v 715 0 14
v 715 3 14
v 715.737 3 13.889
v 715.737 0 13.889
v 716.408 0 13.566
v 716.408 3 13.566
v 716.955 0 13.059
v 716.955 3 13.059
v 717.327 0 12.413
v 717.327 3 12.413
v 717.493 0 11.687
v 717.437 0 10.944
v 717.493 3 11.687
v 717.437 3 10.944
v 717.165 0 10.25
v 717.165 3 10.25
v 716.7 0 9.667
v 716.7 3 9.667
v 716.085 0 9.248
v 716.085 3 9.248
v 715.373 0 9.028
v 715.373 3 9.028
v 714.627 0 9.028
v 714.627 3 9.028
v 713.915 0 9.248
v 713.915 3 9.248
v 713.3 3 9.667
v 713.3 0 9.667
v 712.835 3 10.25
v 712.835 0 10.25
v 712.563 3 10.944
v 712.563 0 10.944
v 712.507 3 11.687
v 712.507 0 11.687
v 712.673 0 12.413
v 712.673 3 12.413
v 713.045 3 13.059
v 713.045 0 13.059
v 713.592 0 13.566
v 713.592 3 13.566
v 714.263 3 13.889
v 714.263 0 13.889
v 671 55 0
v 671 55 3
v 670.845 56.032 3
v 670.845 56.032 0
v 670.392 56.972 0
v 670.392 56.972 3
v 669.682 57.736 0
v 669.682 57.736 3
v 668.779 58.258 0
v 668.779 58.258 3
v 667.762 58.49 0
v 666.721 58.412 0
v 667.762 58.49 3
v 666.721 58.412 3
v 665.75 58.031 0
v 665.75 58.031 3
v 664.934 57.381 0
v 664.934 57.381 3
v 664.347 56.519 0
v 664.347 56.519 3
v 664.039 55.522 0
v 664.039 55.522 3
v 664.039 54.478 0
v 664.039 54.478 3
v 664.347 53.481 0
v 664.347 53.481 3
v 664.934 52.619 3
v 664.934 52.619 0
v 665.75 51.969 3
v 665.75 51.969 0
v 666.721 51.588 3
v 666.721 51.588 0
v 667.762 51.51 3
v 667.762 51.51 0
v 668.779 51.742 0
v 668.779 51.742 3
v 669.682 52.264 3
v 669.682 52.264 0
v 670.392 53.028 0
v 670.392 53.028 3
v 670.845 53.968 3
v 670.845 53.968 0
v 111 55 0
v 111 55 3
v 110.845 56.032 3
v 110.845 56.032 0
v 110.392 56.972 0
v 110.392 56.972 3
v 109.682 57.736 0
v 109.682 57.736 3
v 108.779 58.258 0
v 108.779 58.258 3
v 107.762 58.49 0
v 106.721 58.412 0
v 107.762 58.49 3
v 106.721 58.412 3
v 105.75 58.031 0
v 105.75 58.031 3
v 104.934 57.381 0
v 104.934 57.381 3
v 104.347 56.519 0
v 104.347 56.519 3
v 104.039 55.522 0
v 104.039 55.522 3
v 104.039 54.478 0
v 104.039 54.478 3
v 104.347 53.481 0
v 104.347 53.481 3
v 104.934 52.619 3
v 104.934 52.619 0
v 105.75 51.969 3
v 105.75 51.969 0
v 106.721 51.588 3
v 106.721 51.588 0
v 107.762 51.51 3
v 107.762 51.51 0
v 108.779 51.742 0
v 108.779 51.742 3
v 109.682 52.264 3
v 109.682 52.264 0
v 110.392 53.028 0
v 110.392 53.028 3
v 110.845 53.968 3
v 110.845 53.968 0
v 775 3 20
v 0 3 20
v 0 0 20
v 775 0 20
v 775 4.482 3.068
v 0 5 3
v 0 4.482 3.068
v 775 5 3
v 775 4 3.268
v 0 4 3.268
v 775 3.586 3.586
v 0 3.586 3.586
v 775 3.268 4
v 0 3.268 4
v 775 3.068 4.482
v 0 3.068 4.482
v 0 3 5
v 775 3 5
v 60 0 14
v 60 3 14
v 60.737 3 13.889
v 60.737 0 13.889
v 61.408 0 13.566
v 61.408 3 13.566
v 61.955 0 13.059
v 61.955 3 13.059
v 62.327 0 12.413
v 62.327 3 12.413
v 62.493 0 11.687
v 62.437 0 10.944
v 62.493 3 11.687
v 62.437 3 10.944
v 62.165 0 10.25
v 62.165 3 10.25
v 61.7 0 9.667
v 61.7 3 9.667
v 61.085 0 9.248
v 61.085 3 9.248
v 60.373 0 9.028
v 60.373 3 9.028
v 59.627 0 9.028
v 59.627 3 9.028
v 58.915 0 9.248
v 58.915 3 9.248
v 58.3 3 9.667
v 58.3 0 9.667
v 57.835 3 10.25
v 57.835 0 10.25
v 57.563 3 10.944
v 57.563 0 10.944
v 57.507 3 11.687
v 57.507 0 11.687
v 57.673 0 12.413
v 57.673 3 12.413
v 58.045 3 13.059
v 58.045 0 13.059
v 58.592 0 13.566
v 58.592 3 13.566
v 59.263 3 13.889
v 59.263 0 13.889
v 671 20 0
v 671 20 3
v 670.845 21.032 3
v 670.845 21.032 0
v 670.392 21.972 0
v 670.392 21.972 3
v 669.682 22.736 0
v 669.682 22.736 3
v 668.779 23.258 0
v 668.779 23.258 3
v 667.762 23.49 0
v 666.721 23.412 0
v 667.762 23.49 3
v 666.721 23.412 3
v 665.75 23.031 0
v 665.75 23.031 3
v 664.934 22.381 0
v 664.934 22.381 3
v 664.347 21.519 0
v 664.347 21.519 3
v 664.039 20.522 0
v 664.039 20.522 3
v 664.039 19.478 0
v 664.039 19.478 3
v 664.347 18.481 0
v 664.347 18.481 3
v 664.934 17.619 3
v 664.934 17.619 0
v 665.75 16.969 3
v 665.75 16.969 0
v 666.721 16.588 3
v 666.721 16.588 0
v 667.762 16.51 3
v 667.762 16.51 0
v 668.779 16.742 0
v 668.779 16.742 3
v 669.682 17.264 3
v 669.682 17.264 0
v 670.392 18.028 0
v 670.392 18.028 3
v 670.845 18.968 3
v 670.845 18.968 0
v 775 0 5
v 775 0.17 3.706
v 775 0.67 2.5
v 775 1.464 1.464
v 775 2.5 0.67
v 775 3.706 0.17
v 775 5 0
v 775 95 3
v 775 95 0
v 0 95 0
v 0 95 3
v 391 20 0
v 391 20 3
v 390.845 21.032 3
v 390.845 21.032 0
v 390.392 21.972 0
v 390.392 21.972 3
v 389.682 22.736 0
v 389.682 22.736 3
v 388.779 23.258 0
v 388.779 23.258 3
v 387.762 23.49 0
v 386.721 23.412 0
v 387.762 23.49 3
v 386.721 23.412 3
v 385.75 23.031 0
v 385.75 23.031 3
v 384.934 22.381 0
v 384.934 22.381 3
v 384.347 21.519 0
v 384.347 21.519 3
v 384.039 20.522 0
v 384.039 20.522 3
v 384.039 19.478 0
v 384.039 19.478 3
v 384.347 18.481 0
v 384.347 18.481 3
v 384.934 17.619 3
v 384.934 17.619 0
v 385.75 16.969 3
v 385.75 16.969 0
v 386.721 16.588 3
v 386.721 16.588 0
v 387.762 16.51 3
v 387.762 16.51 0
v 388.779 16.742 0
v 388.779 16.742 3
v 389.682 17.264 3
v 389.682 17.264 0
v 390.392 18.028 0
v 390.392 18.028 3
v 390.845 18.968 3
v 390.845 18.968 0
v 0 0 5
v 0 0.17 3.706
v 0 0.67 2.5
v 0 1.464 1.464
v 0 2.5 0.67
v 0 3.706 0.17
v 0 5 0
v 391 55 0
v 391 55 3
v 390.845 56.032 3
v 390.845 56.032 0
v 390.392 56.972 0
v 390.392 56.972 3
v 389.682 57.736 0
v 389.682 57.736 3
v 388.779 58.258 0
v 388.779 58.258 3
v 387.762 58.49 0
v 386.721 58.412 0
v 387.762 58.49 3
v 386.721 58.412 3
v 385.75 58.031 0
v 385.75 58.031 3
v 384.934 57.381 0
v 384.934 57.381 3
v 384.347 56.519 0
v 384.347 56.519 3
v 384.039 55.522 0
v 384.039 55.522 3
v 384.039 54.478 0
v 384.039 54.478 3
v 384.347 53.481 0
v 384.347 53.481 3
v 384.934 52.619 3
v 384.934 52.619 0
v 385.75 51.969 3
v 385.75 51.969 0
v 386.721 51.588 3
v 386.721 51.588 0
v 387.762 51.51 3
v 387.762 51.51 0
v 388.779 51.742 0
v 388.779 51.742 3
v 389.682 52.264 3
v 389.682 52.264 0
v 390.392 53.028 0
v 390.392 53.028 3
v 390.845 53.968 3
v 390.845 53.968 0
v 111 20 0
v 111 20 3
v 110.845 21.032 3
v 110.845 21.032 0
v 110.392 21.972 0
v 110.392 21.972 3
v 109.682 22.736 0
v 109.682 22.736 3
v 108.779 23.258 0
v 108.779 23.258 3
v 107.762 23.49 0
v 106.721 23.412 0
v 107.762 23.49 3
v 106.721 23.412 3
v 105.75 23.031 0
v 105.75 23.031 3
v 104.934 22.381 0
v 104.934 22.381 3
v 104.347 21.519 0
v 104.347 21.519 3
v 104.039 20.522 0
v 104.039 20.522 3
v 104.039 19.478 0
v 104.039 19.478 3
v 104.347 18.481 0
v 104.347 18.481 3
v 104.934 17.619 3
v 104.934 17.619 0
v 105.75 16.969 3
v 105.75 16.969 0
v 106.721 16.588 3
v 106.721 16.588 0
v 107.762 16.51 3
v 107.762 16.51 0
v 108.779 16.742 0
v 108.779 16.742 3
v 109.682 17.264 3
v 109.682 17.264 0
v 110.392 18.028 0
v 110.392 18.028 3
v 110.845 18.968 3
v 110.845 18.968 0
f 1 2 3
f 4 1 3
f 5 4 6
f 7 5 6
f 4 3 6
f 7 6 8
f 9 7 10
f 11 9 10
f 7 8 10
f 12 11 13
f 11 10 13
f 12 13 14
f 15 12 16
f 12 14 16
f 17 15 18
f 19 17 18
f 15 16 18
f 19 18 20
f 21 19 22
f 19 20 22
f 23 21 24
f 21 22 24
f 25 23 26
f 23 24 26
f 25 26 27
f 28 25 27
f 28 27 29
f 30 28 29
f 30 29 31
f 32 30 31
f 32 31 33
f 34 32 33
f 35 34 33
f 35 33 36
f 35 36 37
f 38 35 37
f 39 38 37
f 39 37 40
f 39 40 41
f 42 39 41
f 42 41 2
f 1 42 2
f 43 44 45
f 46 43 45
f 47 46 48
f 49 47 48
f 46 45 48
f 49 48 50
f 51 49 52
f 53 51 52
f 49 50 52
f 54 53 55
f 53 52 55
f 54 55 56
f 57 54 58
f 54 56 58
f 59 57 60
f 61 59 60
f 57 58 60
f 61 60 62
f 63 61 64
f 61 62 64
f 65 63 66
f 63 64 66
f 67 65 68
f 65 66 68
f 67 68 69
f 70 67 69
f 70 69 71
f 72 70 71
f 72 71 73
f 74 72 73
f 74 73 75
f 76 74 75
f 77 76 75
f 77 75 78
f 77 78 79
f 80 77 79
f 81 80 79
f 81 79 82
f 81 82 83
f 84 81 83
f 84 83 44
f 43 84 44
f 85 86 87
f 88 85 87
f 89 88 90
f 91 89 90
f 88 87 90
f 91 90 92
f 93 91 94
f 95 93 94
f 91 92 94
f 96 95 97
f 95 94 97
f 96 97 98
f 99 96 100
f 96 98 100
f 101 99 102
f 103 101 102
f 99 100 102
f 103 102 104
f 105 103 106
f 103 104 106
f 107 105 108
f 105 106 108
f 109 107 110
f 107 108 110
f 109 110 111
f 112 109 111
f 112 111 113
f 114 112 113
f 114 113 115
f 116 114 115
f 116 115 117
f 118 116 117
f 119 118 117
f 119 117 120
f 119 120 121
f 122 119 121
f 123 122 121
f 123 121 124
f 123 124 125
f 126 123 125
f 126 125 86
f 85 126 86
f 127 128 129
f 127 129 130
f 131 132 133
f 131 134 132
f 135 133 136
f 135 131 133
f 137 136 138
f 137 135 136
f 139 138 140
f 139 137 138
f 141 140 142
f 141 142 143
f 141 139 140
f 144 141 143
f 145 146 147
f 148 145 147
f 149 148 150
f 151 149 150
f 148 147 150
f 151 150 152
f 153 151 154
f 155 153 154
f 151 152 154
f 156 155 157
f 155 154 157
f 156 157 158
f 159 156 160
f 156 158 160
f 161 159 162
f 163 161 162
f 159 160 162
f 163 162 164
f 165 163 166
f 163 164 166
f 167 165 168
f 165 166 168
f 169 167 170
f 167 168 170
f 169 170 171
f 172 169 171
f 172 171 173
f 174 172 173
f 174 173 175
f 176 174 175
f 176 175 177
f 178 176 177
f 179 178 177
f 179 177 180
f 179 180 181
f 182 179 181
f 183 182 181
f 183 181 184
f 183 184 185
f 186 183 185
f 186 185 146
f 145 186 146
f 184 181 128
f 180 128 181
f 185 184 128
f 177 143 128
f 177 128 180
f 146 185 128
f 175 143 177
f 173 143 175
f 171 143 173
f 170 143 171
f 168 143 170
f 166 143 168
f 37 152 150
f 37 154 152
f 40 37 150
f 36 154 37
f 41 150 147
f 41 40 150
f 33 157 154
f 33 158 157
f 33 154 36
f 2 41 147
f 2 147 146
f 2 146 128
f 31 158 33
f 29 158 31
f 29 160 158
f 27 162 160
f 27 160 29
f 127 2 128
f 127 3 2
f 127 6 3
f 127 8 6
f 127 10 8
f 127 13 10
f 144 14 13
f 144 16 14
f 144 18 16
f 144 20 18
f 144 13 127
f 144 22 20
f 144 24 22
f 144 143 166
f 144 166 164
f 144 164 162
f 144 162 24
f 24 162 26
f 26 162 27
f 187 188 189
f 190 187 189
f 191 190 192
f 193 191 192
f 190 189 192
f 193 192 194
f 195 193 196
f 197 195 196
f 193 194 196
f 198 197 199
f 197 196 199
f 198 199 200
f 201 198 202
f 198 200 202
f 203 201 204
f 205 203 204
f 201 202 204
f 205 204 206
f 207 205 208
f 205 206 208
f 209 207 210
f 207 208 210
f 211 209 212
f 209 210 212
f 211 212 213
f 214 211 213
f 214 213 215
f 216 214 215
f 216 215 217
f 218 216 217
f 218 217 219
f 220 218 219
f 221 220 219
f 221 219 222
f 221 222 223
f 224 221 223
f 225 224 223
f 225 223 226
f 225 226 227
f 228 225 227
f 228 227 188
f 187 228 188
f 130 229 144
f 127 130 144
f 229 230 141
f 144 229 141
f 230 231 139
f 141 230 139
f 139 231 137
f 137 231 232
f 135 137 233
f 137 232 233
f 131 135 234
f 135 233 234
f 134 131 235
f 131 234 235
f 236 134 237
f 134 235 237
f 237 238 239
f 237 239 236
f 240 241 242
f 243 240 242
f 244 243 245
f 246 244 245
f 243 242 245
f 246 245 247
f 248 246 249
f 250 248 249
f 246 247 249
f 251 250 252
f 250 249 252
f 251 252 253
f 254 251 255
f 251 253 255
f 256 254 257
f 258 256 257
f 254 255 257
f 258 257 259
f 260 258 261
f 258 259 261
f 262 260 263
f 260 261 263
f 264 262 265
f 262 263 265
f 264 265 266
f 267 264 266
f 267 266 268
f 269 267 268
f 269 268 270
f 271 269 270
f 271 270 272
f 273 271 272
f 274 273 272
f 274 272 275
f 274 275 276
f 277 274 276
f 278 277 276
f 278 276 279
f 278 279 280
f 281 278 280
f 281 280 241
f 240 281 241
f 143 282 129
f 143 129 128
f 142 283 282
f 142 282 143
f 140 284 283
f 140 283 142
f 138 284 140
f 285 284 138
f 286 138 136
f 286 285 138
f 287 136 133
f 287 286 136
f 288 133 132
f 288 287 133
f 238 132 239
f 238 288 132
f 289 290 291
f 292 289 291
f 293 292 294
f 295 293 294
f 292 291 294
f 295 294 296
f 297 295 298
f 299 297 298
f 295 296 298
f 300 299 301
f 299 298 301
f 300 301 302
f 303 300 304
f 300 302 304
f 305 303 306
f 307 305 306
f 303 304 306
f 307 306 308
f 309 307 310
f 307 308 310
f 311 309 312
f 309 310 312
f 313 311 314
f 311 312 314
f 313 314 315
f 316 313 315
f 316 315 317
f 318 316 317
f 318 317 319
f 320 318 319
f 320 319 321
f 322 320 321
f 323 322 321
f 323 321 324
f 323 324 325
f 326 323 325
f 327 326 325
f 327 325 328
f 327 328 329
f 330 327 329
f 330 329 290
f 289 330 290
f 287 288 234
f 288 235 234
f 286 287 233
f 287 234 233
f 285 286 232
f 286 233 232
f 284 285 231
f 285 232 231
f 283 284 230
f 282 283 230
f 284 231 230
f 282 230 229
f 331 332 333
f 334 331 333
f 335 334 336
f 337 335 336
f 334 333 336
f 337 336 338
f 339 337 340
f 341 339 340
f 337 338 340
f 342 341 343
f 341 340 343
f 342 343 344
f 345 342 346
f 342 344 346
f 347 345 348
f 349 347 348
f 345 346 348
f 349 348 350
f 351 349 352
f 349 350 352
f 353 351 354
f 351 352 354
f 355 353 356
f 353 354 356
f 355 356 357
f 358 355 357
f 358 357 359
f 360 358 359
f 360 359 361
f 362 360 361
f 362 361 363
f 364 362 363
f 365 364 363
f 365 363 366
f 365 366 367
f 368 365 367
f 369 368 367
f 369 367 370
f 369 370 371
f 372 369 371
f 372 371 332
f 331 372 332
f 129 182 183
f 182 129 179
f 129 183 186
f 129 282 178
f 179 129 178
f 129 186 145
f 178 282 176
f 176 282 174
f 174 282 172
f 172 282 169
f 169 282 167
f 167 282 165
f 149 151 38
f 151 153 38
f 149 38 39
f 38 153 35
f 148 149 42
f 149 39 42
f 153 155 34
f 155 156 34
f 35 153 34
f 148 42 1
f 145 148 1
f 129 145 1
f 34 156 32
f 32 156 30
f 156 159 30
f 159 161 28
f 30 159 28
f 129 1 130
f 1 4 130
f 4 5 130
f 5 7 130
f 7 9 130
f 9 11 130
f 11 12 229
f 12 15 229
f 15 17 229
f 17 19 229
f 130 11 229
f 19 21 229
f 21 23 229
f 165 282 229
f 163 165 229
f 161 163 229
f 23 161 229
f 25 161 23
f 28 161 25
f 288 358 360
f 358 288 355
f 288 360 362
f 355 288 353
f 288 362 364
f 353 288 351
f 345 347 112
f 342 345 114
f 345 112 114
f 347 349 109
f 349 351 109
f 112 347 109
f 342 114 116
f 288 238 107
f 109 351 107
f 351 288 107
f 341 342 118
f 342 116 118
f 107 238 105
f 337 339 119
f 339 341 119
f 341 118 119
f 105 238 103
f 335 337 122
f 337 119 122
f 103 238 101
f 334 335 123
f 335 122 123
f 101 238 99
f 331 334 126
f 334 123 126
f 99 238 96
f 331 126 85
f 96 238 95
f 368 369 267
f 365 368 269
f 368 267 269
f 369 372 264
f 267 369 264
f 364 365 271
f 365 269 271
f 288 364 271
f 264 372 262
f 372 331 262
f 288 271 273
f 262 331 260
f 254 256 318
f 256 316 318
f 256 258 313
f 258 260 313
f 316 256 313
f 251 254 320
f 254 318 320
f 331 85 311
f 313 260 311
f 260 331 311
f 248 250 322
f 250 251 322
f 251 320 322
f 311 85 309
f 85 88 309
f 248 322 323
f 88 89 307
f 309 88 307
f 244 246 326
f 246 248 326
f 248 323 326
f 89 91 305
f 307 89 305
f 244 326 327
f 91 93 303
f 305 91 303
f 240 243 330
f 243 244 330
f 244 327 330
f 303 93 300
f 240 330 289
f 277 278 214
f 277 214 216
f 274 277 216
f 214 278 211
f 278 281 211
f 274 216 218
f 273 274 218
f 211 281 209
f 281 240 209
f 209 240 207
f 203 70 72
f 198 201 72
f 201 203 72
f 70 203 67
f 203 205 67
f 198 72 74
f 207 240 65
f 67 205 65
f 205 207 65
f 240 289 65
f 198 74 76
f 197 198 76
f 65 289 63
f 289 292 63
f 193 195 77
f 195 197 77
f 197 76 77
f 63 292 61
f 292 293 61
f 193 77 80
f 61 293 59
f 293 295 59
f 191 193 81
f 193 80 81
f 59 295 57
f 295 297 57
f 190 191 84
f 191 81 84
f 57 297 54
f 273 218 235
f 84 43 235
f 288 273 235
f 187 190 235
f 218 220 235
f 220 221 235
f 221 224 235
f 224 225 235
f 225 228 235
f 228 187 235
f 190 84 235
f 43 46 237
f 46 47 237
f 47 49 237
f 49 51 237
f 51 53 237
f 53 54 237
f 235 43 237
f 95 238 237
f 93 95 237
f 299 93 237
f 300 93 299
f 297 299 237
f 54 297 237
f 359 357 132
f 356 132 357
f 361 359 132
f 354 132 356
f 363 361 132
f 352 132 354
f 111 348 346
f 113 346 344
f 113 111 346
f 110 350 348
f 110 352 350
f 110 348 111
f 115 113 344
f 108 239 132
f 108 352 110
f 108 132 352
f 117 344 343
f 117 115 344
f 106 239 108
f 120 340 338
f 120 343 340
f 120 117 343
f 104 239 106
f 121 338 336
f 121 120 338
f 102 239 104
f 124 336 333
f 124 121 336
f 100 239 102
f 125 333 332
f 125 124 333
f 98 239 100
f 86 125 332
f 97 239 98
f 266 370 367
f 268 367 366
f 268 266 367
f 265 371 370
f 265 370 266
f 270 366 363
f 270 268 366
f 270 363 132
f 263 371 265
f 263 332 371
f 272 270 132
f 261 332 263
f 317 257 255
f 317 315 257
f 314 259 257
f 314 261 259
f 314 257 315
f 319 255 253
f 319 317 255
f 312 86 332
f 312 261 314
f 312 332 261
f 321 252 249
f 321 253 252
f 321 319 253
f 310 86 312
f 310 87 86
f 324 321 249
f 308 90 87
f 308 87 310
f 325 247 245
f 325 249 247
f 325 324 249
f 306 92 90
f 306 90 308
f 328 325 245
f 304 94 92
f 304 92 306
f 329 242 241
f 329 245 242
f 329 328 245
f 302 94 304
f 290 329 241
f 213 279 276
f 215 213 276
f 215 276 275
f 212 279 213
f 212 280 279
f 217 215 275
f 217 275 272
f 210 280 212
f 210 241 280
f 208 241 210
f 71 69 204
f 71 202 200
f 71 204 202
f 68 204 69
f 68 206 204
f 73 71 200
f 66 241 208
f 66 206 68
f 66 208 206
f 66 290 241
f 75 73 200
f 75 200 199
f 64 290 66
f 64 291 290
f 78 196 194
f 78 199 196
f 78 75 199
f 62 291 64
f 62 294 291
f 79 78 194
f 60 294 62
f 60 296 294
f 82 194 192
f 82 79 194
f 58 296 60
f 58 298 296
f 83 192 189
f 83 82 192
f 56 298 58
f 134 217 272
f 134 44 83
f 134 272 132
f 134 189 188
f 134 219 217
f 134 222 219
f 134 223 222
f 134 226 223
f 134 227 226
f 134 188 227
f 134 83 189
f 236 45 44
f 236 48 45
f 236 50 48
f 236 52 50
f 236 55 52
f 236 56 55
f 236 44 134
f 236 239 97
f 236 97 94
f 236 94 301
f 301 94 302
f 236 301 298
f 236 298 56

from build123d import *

# Parameters (mm, degrees)
SKETCH_1_W          = 775
SKETCH_1_H          = 95
EXTRUDE_1_DEPTH     = 3
SKETCH_2_W          = 775
SKETCH_2_H          = 3
EXTRUDE_2_DEPTH     = 17
SKETCH_3_R          = 3.5
CUT_EXTRUDE_1_DEPTH = 17
SKETCH_4_R          = 2.5
CUT_EXTRUDE_2_DEPTH = 17
FILLET_1_R          = 5
FILLET_2_R          = 2


with BuildPart() as part:
    # 스케치1 → 보스-돌출1 (new body)
    with BuildSketch(Plane.XY):
        with Locations((387.5, 47.5)):
            Rectangle(SKETCH_1_W, SKETCH_1_H)
    extrude(amount=EXTRUDE_1_DEPTH)

    # 스케치2 → 보스-돌출2 (add)
    with BuildSketch(Plane.XY.offset(3)):
        with Locations((387.5, 1.5)):
            Rectangle(SKETCH_2_W, SKETCH_2_H)
    extrude(amount=EXTRUDE_2_DEPTH)

    # 스케치3 → 컷-돌출1 (cut)
    with BuildSketch(Plane.XY.offset(3)):
        with Locations((107.5, 55)):
            Circle(SKETCH_3_R)
        with Locations((107.5, 20)):
            Circle(SKETCH_3_R)
        with Locations((387.5, 55)):
            Circle(SKETCH_3_R)
        with Locations((387.5, 20)):
            Circle(SKETCH_3_R)
        with Locations((667.5, 55)):
            Circle(SKETCH_3_R)
        with Locations((667.5, 20)):
            Circle(SKETCH_3_R)
    extrude(amount=-CUT_EXTRUDE_1_DEPTH, mode=Mode.SUBTRACT)

    # 스케치4 → 컷-돌출2 (cut)
    with BuildSketch(Plane(origin=(0, 3, 0), x_dir=(1, 0, 0), z_dir=(0, 1, 0))):
        with Locations(Location((60, -11.5, 0), (0, 0, 270))):
            Circle(SKETCH_4_R)
        with Locations(Location((715, -11.5, 0), (0, 0, 270))):
            Circle(SKETCH_4_R)
    extrude(amount=-CUT_EXTRUDE_2_DEPTH, mode=Mode.SUBTRACT)

    # 필렛1
    fillet_1_edges = [part.edges().sort_by_distance(p)[0] for p in [
        (387.5, 0, 0),
    ]]
    fillet(fillet_1_edges, radius=FILLET_1_R)

    # 필렛2
    fillet_2_edges = [part.edges().sort_by_distance(p)[0] for p in [
        (387.5, 3, 3),
    ]]
    fillet(fillet_2_edges, radius=FILLET_2_R)


solid = part.part
